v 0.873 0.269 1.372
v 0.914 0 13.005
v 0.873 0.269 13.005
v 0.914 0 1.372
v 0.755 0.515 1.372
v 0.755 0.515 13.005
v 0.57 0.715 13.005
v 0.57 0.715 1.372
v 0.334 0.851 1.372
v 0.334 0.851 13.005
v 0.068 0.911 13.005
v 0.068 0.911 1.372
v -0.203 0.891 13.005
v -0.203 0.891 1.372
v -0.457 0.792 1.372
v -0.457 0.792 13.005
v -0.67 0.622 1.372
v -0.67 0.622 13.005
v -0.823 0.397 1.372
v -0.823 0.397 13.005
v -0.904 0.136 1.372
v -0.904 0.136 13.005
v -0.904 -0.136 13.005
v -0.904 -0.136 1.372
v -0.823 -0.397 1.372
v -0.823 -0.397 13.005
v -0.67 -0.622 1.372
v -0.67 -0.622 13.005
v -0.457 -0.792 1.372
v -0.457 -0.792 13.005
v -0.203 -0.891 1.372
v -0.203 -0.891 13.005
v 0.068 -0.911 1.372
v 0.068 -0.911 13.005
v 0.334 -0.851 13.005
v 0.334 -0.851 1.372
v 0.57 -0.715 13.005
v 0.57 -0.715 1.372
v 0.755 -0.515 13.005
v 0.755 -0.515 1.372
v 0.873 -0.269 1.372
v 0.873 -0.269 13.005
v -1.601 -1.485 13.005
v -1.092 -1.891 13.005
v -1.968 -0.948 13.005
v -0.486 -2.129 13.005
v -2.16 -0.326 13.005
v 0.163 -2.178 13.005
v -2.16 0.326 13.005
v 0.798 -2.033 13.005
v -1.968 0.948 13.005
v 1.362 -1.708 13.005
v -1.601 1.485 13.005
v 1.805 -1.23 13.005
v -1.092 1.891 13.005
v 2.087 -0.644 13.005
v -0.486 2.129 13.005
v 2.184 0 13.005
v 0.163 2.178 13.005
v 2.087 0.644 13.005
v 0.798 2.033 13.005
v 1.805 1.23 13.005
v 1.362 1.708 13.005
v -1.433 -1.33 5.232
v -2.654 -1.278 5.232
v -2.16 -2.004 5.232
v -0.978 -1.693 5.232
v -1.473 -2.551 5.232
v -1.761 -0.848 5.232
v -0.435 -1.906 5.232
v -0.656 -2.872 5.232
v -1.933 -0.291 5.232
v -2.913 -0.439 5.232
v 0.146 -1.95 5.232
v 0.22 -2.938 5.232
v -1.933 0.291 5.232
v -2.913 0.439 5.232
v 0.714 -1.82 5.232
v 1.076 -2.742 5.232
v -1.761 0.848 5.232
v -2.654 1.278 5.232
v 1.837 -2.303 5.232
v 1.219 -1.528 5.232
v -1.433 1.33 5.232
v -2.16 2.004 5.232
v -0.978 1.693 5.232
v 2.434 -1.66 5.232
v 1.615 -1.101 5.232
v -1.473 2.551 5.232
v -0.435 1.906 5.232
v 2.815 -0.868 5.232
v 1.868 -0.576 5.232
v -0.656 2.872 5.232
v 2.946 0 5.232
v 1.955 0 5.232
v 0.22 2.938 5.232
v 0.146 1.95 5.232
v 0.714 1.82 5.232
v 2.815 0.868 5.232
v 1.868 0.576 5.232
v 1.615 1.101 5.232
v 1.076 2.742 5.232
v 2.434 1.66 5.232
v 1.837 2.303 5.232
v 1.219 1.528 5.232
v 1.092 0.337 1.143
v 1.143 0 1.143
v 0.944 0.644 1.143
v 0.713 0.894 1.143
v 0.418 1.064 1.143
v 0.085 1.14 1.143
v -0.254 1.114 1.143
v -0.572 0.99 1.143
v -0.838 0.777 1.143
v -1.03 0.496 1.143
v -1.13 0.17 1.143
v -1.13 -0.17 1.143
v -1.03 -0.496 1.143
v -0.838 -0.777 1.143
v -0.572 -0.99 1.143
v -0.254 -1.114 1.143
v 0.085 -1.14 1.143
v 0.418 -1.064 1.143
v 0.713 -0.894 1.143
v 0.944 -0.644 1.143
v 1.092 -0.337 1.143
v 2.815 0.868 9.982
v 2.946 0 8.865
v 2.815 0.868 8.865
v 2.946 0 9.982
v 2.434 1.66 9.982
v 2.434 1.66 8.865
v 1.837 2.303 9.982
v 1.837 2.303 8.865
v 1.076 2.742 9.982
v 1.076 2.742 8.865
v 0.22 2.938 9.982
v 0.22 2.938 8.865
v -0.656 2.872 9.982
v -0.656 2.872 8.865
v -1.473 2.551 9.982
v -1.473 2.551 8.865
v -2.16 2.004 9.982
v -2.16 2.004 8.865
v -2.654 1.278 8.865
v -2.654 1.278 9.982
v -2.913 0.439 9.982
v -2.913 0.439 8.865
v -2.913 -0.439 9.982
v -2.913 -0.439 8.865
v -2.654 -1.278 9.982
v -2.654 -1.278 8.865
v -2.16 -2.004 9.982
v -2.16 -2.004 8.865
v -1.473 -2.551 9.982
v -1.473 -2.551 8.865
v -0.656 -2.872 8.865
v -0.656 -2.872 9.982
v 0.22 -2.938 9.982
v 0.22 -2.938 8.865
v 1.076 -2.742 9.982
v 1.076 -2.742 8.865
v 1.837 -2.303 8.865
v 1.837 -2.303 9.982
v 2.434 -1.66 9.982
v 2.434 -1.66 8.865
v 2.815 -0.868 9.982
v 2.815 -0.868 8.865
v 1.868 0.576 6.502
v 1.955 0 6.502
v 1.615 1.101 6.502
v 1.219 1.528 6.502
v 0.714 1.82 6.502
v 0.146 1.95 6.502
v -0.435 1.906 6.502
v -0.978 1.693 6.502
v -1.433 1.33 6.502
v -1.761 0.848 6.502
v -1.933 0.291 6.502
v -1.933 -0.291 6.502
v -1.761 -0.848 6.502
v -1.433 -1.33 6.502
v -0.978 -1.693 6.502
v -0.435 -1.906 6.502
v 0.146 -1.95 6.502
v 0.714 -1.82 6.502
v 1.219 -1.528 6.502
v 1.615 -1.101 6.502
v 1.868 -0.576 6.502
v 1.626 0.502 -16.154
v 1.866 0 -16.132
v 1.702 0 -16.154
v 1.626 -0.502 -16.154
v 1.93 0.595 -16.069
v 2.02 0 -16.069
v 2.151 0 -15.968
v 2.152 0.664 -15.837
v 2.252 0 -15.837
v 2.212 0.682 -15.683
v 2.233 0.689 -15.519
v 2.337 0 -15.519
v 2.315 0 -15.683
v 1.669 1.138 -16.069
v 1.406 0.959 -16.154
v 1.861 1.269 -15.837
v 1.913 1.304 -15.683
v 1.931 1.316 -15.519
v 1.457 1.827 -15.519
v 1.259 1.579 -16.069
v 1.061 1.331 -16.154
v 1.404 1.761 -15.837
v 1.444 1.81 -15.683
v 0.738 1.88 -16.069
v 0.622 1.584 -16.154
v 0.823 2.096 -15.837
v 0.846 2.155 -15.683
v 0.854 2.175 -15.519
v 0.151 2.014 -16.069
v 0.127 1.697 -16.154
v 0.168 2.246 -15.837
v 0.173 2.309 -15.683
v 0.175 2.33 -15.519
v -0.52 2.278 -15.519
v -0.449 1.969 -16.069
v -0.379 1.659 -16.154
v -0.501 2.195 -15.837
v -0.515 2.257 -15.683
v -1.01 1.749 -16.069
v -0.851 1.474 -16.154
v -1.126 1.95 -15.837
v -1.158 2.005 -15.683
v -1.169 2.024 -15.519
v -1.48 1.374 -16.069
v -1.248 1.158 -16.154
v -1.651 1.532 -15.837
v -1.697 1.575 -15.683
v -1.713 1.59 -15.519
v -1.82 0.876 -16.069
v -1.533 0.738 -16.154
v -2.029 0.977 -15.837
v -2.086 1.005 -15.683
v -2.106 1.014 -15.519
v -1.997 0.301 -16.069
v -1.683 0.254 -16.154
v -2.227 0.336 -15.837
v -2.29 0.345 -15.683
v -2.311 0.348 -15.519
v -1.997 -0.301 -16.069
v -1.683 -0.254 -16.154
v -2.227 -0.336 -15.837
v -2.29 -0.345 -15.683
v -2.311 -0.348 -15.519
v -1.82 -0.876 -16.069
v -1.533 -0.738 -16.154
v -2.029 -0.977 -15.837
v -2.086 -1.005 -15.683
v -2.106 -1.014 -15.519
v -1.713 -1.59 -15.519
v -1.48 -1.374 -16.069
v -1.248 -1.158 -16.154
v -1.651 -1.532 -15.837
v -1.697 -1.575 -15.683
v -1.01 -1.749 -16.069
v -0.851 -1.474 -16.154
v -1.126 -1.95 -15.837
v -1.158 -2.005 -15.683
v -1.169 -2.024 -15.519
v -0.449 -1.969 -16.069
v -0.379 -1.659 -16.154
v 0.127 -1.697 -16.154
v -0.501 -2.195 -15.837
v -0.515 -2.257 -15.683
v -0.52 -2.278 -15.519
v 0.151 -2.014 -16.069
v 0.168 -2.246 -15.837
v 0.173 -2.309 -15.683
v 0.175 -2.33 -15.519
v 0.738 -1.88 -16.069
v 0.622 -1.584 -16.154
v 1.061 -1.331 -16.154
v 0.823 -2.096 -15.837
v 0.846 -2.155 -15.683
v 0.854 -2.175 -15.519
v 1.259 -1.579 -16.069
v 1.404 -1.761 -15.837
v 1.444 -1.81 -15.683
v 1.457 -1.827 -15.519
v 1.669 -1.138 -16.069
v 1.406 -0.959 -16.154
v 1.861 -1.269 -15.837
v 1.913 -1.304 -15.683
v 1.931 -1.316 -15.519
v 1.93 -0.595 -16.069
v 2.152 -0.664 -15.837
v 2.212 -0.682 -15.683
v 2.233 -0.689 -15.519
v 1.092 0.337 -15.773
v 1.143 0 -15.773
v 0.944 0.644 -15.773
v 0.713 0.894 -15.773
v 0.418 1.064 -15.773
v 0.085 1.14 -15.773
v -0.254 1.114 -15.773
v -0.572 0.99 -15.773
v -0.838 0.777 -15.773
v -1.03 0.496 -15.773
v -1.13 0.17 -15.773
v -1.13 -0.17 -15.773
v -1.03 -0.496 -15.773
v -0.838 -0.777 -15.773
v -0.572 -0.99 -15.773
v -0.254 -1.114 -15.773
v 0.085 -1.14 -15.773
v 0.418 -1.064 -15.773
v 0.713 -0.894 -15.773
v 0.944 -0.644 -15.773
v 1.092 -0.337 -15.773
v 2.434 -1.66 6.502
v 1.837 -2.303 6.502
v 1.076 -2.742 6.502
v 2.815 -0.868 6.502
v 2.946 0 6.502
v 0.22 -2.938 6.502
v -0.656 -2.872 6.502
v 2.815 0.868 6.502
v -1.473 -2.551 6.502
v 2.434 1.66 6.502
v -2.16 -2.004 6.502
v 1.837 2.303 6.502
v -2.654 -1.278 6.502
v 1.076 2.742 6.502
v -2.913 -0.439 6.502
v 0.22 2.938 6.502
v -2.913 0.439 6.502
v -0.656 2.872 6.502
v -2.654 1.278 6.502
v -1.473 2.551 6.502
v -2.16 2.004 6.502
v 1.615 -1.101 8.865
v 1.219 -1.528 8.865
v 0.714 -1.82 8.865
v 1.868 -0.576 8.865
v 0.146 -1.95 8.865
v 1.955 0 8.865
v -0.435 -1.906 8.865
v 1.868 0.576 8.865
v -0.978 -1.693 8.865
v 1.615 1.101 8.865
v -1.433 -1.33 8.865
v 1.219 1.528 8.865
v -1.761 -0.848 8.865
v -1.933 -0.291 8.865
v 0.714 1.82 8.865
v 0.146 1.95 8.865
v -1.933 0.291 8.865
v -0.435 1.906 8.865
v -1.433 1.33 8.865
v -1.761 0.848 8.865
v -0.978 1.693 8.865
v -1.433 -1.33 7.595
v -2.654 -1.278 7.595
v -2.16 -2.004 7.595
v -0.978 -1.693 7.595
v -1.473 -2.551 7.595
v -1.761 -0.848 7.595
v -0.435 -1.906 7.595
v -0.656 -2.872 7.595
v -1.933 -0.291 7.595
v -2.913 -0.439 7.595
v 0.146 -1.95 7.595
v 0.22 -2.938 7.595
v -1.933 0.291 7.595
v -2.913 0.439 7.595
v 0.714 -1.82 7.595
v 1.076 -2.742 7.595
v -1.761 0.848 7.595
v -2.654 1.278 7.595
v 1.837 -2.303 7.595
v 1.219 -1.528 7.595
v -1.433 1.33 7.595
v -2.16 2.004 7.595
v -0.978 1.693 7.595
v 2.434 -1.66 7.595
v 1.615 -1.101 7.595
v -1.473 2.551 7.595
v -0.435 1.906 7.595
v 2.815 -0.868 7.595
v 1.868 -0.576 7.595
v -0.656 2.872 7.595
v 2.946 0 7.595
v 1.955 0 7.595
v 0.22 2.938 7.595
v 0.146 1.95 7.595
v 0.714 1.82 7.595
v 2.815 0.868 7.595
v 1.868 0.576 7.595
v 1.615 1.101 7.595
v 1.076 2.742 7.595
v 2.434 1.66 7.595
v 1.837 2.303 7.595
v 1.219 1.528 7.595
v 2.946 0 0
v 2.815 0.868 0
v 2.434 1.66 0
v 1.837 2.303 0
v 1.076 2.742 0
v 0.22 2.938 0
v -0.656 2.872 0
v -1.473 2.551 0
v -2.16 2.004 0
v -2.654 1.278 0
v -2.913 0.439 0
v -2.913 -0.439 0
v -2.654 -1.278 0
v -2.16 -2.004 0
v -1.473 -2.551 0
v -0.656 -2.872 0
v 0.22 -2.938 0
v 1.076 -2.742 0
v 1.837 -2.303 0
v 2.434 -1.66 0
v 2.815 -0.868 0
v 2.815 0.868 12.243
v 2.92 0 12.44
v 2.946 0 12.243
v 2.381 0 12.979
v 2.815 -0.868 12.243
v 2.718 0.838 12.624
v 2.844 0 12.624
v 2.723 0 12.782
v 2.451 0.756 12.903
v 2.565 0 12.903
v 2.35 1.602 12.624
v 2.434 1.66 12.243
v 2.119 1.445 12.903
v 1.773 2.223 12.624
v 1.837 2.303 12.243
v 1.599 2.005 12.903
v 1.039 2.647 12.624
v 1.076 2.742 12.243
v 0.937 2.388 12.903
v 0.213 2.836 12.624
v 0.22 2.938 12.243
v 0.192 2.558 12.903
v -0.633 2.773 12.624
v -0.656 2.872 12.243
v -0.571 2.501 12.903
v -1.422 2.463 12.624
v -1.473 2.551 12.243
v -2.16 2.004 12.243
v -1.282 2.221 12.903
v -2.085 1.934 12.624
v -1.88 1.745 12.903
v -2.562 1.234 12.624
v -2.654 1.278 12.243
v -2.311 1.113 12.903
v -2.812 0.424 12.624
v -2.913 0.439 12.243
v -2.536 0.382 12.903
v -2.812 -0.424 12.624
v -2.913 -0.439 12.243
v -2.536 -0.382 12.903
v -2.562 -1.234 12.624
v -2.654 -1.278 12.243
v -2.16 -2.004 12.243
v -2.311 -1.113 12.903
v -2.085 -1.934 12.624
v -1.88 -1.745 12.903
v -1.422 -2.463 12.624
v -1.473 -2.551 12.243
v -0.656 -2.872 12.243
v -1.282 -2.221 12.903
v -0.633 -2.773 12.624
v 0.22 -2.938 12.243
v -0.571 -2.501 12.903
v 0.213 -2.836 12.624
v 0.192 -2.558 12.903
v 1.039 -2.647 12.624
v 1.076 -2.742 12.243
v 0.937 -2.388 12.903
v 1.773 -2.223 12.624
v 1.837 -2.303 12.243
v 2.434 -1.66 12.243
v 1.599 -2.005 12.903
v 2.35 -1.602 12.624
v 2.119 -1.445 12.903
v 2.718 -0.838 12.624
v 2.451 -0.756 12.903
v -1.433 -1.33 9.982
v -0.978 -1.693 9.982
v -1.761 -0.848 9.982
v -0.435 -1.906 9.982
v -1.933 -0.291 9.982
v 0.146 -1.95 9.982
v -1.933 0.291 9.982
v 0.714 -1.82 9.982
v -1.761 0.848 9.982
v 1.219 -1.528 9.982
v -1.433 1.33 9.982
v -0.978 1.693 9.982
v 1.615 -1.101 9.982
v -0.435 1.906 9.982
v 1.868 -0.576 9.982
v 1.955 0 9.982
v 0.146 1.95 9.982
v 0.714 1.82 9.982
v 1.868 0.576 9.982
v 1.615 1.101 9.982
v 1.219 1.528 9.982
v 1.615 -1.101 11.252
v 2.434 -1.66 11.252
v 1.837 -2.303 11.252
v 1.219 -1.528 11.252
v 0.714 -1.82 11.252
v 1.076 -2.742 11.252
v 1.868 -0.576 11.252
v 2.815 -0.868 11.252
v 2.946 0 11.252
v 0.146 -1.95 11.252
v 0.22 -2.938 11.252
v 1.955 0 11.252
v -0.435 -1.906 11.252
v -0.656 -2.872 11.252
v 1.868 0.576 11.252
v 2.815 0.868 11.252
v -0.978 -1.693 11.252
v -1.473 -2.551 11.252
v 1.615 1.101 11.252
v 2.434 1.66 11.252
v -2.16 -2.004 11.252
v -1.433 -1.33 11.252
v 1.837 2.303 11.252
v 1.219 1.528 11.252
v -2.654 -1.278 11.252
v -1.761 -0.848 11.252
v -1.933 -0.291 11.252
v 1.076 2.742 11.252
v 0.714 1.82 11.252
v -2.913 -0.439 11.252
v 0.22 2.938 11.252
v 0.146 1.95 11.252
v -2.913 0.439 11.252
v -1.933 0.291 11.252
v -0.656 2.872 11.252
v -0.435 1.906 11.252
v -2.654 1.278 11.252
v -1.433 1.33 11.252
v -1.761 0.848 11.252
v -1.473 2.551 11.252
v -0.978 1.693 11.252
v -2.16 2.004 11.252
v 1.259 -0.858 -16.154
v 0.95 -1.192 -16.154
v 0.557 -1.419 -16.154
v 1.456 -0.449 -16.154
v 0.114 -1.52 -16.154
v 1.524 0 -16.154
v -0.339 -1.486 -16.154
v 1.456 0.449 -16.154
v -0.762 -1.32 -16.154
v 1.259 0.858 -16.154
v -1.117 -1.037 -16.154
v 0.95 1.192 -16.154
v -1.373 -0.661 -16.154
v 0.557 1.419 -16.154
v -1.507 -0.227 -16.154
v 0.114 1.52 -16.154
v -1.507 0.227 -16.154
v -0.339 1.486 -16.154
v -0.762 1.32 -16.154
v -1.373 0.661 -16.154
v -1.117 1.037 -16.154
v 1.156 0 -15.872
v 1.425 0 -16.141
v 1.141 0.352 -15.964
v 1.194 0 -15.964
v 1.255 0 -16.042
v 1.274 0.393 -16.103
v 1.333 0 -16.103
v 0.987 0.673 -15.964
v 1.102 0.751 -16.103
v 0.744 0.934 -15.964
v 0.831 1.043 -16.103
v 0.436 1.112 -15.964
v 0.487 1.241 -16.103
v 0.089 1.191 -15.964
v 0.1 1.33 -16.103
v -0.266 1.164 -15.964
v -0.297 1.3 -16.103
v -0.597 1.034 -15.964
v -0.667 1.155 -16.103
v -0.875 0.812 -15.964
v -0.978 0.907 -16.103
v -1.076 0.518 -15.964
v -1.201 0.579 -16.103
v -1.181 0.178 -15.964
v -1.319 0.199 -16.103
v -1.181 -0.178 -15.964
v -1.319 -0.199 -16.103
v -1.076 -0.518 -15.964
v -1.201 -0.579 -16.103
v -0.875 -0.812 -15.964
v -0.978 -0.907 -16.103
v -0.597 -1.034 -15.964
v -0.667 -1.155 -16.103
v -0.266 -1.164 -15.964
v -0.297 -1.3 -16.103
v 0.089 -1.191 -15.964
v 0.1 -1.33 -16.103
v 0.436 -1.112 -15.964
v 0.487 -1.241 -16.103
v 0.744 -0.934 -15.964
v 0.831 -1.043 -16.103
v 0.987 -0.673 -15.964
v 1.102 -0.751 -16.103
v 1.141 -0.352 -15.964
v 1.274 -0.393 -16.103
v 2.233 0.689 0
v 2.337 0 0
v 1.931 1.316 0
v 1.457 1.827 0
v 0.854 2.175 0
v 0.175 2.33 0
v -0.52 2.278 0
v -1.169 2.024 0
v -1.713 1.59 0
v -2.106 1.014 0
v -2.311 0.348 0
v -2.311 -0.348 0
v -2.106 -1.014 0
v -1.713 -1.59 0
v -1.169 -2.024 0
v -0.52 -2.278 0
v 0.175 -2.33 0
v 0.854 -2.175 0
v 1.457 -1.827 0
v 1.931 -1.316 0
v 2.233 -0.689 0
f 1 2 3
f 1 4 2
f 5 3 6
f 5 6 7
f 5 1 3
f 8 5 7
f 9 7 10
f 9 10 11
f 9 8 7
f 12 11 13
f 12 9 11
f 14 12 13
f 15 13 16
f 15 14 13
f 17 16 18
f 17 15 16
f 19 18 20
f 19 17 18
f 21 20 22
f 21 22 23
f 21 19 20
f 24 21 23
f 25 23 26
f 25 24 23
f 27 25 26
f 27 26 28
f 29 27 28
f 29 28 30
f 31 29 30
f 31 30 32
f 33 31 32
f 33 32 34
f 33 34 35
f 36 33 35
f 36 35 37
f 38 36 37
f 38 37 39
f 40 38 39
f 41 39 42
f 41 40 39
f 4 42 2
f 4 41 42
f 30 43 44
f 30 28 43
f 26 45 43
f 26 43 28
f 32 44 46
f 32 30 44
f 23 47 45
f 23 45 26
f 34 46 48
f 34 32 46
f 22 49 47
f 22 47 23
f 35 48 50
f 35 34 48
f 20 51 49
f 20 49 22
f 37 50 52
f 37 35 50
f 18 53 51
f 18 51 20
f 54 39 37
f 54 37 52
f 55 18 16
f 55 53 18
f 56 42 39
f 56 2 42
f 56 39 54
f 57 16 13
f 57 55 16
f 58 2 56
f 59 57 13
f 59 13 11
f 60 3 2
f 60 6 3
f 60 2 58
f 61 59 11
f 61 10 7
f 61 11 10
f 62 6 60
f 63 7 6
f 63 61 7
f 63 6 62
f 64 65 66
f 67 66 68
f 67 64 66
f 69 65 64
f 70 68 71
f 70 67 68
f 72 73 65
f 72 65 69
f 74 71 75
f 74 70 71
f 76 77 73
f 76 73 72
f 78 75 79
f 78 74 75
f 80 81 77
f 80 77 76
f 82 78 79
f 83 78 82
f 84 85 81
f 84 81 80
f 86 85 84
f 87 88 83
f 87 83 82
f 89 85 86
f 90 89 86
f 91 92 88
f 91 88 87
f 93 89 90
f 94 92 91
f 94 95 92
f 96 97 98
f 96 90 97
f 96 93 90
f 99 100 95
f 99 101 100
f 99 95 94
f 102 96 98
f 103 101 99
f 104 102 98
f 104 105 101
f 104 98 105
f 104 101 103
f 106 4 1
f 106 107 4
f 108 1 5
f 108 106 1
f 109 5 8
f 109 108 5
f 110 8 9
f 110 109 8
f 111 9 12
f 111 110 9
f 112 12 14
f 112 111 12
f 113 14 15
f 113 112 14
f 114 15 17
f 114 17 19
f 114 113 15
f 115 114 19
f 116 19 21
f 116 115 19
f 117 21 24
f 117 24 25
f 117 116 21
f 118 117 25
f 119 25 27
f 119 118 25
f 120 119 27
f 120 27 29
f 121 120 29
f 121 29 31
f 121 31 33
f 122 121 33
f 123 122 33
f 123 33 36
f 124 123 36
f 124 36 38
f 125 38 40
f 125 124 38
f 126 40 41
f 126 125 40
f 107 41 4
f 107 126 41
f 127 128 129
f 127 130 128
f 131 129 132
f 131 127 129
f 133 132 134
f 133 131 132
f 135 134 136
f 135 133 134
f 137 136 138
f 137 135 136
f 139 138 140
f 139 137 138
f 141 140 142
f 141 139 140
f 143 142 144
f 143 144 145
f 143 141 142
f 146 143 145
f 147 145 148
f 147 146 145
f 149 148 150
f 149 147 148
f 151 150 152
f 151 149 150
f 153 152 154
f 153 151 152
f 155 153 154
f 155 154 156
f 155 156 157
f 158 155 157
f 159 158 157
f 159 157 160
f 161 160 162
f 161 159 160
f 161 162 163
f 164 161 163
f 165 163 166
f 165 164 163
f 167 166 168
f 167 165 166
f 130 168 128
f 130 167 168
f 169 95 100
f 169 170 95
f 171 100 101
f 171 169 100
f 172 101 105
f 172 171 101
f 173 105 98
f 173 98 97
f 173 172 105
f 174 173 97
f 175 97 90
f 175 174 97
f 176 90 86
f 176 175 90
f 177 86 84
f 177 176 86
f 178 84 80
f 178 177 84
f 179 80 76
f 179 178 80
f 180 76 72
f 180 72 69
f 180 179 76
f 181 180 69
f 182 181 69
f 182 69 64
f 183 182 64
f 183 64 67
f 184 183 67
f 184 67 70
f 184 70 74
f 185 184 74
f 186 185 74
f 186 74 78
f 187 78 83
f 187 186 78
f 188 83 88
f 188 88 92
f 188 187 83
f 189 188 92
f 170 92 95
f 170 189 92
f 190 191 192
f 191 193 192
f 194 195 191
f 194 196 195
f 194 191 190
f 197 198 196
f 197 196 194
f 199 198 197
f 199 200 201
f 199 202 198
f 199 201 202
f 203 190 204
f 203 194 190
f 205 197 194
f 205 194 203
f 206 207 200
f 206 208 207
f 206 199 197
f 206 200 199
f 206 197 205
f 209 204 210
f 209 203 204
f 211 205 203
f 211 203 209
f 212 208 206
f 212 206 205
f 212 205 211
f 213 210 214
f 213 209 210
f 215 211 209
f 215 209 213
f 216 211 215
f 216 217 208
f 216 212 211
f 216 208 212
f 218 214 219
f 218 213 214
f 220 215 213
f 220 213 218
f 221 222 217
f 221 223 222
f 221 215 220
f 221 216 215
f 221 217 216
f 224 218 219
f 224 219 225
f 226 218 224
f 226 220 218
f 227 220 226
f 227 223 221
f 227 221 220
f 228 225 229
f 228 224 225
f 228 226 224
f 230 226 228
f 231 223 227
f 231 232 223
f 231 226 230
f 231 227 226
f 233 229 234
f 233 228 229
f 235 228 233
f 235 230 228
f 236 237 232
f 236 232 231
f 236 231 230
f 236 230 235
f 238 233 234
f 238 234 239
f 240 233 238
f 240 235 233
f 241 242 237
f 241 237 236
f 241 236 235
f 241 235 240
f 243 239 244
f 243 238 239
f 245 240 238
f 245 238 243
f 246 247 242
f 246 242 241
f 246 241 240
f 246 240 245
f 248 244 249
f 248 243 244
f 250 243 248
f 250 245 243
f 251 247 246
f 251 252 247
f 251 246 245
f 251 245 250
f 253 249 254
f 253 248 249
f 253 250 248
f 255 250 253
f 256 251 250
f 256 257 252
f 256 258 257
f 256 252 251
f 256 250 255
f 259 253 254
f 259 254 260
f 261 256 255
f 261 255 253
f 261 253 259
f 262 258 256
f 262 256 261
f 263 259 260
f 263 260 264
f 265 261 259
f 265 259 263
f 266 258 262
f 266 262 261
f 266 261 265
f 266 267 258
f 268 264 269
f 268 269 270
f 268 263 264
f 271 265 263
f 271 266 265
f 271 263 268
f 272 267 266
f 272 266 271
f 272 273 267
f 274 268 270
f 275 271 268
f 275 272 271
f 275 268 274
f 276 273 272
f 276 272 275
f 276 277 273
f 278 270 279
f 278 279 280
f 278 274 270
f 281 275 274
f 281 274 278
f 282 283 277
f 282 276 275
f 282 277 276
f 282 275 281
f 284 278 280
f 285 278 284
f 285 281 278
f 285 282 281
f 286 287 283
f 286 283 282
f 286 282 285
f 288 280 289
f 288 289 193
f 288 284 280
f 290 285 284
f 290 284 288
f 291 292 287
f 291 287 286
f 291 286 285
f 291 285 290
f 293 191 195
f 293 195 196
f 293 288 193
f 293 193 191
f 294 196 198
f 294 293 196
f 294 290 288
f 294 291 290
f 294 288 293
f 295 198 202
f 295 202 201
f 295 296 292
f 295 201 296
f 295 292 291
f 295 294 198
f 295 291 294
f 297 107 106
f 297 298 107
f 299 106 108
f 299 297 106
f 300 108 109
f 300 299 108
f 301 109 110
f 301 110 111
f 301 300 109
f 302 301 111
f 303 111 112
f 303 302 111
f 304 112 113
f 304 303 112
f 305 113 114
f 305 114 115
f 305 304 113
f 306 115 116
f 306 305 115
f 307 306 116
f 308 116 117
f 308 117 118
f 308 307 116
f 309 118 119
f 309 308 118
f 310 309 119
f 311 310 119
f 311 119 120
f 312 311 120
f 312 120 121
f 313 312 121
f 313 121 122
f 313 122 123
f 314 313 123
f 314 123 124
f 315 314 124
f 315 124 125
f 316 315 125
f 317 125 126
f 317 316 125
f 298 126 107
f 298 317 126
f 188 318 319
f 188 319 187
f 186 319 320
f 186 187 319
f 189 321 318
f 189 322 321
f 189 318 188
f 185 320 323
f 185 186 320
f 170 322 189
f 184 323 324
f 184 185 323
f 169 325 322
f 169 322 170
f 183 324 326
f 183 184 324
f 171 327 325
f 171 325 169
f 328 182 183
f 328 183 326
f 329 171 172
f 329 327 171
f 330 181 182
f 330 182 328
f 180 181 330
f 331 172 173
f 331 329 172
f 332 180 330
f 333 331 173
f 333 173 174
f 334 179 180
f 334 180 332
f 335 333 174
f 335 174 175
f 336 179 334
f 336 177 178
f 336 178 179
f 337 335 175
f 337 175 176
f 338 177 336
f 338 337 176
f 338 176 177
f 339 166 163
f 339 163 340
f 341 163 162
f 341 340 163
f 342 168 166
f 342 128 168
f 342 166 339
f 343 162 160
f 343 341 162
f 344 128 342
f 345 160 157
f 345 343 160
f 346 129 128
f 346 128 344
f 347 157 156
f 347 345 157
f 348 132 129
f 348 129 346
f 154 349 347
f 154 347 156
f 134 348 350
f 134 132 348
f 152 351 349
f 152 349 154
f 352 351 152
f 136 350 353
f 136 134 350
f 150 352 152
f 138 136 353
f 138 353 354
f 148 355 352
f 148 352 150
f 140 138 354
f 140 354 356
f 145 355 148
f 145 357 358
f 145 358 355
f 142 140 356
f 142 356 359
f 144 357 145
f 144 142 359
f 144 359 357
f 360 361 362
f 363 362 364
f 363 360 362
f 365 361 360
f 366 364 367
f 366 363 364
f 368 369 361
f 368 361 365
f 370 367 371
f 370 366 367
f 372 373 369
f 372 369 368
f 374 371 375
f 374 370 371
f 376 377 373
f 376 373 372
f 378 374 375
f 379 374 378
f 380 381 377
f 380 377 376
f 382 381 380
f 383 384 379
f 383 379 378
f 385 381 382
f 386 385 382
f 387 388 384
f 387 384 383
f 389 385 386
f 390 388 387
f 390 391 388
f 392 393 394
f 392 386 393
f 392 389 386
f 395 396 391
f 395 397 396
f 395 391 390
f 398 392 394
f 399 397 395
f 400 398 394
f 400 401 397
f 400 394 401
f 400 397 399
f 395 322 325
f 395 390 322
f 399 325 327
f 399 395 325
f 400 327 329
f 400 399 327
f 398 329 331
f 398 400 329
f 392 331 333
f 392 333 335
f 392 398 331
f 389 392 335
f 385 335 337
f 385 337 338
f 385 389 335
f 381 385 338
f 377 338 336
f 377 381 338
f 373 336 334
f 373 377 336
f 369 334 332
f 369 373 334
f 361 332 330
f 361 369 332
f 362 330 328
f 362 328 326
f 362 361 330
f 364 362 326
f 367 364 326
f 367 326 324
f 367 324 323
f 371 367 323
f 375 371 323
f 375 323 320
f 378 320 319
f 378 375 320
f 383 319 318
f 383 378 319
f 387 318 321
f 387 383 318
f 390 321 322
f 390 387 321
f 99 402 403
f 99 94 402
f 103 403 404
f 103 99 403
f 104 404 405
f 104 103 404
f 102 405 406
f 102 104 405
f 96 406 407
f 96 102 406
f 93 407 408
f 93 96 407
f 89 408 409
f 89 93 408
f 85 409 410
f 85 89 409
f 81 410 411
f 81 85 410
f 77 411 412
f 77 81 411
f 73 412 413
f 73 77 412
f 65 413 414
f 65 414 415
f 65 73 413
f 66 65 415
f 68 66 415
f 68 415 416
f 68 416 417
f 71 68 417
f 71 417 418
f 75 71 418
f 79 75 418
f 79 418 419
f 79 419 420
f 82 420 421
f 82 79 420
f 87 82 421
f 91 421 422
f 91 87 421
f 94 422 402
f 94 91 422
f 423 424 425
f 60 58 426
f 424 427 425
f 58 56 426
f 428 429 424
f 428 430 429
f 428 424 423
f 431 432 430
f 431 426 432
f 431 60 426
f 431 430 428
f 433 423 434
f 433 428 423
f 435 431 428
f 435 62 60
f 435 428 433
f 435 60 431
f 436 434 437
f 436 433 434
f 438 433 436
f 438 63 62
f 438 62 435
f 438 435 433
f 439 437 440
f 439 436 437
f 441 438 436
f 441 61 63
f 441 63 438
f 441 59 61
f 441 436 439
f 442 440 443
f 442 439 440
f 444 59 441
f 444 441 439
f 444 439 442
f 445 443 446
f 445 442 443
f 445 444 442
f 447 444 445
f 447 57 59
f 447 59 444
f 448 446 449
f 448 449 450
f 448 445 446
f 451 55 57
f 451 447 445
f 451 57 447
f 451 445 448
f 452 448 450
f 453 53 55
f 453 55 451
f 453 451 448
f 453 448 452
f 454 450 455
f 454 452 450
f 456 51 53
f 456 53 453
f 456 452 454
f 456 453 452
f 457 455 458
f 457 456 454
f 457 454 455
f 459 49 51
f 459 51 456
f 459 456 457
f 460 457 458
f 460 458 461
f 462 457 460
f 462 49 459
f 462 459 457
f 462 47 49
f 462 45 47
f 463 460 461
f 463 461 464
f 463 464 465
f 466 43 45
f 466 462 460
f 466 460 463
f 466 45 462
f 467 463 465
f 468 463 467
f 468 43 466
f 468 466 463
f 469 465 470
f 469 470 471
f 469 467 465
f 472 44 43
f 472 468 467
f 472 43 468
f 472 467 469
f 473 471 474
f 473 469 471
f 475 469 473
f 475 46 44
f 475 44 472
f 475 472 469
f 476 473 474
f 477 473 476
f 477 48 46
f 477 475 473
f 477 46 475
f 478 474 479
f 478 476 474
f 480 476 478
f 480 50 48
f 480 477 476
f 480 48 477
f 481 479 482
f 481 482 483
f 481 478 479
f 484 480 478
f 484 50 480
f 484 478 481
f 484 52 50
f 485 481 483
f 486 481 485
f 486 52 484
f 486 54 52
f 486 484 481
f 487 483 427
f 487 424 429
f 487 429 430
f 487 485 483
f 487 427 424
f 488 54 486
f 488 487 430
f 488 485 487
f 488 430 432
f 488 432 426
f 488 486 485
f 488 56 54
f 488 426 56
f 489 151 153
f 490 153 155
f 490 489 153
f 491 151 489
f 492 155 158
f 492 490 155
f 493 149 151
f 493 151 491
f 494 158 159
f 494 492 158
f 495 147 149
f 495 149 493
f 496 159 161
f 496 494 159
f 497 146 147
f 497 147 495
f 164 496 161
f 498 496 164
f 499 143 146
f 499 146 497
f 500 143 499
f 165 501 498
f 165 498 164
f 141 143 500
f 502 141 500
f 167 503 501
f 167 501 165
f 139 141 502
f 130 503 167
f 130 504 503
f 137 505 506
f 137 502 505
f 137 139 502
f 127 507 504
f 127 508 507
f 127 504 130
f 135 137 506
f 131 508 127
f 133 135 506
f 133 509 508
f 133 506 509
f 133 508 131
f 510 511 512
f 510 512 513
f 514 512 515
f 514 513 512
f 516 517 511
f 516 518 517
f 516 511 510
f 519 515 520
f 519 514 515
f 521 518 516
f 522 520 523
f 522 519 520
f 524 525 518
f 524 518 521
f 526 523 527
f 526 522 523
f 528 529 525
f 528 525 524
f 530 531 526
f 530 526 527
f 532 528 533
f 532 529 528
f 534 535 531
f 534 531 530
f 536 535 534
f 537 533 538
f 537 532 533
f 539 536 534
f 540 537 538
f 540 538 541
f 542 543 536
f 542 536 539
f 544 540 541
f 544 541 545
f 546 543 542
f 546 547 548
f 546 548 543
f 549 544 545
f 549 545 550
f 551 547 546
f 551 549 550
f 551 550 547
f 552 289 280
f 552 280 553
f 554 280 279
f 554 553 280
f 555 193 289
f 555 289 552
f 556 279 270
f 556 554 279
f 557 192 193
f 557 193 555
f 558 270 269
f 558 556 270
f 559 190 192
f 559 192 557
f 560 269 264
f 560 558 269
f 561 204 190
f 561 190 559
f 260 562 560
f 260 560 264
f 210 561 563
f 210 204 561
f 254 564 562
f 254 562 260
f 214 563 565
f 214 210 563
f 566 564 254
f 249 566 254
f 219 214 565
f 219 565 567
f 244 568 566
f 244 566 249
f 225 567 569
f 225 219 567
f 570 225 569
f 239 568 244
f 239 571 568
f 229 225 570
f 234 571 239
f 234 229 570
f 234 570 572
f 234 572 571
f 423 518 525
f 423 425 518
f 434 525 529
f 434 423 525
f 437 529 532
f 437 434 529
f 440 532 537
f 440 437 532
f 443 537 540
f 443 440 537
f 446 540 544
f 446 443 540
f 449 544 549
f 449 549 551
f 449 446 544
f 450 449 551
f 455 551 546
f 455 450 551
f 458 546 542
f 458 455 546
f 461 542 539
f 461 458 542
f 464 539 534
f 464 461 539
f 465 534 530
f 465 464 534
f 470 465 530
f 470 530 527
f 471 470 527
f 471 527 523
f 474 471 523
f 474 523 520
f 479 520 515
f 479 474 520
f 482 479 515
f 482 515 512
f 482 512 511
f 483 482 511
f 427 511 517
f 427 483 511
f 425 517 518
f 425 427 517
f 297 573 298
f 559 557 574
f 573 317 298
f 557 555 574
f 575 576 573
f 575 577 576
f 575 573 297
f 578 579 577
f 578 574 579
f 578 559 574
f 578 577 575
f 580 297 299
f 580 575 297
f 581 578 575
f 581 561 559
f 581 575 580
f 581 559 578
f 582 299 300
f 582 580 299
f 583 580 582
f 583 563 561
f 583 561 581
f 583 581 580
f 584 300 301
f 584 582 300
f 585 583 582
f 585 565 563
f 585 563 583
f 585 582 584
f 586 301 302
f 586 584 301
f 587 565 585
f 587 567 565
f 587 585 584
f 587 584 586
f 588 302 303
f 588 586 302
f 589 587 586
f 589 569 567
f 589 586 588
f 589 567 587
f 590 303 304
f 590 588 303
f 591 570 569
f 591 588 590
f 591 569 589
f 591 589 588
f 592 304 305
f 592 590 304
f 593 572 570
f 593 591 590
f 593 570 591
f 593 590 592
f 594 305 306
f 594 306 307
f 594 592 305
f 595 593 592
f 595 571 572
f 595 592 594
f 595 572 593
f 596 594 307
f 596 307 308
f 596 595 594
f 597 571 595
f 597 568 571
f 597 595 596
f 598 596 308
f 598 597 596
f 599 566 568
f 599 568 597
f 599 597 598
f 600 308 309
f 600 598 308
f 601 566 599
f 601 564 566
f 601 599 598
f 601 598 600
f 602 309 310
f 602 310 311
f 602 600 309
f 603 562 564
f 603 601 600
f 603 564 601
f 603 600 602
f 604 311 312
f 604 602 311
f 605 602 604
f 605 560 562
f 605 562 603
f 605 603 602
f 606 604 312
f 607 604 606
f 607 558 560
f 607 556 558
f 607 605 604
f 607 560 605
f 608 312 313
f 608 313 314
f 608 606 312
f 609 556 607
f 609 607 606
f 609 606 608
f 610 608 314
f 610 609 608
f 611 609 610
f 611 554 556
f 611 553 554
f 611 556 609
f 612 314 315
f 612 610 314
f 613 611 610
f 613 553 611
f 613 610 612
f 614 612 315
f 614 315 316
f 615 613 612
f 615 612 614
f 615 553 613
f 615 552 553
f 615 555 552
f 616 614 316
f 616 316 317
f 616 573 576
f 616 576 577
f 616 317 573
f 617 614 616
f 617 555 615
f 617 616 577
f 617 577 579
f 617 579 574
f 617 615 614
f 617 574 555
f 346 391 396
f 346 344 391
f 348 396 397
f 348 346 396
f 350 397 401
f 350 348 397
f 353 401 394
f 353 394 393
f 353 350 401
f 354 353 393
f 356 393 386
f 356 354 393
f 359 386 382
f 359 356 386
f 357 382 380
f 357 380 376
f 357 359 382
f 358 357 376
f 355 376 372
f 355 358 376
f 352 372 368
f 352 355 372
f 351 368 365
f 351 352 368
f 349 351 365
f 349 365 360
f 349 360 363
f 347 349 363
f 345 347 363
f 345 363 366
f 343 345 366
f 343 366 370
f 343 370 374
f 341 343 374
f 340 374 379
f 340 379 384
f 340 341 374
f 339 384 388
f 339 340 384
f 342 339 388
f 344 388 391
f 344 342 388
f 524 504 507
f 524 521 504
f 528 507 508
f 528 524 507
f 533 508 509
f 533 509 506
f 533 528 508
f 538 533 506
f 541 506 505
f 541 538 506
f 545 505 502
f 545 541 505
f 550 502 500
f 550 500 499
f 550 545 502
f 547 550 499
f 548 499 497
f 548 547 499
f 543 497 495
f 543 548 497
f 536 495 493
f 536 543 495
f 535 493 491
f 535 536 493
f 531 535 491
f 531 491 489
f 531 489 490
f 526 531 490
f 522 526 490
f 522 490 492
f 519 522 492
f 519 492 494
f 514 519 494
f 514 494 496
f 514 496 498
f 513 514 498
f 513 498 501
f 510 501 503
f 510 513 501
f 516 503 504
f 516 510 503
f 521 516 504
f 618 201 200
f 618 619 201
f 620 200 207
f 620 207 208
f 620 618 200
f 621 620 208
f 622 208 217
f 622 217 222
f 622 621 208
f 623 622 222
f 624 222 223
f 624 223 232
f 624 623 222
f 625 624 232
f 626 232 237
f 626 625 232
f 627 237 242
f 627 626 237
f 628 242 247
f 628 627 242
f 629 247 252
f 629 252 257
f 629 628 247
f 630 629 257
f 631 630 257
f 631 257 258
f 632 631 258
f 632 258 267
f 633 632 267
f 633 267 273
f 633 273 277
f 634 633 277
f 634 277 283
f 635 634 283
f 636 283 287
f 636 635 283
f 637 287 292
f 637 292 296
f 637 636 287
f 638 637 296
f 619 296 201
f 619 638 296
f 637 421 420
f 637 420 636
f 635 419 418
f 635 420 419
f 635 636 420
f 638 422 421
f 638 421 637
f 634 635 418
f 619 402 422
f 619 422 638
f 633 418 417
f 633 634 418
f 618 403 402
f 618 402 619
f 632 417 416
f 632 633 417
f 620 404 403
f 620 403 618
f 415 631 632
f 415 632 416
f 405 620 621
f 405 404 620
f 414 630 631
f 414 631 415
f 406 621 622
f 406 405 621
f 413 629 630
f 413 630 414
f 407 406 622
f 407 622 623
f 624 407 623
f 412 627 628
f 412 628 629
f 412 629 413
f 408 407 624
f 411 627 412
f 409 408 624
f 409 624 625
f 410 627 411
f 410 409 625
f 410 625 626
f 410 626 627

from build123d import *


with BuildPart() as f1:
    # F0 (on Front) → F1 (revolve)
    with BuildSketch(Plane.XZ):
        with BuildLine():
            Line((0.914, 13.005), (0.914, 1.372))
            Line((0.914, 1.372), (1.143, 1.143))
            Line((1.143, 1.143), (1.143, -15.773))
            ThreePointArc((1.143, -15.773), (1.254592, -16.042408), (1.524, -16.154))
            Line((1.524, -16.154), (1.702, -16.154))
            ThreePointArc((1.702, -16.154), (2.151013, -15.968013), (2.337, -15.519))
            Line((2.337, -15.519), (2.337, 0))
            Line((2.337, 0), (2.946, 0))
            Line((2.946, 0), (2.946, 5.232))
            Line((2.946, 5.232), (1.955, 5.232))
            Line((1.955, 5.232), (1.955, 6.502))
            Line((1.955, 6.502), (2.946, 6.502))
            Line((2.946, 6.502), (2.946, 7.595))
            Line((2.946, 7.595), (1.955, 7.595))
            Line((1.955, 7.595), (1.955, 8.865))
            Line((1.955, 8.865), (2.946, 8.865))
            Line((2.946, 8.865), (2.946, 9.982))
            Line((2.946, 9.982), (1.955, 9.982))
            Line((1.955, 9.982), (1.955, 11.252))
            Line((1.955, 11.252), (2.946, 11.252))
            Line((2.946, 11.252), (2.946, 12.243))
            ThreePointArc((2.946, 12.243), (2.722815, 12.781815), (2.184, 13.005))
            Line((2.184, 13.005), (0.914, 13.005))
        make_face()
    revolve(axis=Axis((0, 0, 11.256295), (0, 0, 1)))


solid = f1.part
